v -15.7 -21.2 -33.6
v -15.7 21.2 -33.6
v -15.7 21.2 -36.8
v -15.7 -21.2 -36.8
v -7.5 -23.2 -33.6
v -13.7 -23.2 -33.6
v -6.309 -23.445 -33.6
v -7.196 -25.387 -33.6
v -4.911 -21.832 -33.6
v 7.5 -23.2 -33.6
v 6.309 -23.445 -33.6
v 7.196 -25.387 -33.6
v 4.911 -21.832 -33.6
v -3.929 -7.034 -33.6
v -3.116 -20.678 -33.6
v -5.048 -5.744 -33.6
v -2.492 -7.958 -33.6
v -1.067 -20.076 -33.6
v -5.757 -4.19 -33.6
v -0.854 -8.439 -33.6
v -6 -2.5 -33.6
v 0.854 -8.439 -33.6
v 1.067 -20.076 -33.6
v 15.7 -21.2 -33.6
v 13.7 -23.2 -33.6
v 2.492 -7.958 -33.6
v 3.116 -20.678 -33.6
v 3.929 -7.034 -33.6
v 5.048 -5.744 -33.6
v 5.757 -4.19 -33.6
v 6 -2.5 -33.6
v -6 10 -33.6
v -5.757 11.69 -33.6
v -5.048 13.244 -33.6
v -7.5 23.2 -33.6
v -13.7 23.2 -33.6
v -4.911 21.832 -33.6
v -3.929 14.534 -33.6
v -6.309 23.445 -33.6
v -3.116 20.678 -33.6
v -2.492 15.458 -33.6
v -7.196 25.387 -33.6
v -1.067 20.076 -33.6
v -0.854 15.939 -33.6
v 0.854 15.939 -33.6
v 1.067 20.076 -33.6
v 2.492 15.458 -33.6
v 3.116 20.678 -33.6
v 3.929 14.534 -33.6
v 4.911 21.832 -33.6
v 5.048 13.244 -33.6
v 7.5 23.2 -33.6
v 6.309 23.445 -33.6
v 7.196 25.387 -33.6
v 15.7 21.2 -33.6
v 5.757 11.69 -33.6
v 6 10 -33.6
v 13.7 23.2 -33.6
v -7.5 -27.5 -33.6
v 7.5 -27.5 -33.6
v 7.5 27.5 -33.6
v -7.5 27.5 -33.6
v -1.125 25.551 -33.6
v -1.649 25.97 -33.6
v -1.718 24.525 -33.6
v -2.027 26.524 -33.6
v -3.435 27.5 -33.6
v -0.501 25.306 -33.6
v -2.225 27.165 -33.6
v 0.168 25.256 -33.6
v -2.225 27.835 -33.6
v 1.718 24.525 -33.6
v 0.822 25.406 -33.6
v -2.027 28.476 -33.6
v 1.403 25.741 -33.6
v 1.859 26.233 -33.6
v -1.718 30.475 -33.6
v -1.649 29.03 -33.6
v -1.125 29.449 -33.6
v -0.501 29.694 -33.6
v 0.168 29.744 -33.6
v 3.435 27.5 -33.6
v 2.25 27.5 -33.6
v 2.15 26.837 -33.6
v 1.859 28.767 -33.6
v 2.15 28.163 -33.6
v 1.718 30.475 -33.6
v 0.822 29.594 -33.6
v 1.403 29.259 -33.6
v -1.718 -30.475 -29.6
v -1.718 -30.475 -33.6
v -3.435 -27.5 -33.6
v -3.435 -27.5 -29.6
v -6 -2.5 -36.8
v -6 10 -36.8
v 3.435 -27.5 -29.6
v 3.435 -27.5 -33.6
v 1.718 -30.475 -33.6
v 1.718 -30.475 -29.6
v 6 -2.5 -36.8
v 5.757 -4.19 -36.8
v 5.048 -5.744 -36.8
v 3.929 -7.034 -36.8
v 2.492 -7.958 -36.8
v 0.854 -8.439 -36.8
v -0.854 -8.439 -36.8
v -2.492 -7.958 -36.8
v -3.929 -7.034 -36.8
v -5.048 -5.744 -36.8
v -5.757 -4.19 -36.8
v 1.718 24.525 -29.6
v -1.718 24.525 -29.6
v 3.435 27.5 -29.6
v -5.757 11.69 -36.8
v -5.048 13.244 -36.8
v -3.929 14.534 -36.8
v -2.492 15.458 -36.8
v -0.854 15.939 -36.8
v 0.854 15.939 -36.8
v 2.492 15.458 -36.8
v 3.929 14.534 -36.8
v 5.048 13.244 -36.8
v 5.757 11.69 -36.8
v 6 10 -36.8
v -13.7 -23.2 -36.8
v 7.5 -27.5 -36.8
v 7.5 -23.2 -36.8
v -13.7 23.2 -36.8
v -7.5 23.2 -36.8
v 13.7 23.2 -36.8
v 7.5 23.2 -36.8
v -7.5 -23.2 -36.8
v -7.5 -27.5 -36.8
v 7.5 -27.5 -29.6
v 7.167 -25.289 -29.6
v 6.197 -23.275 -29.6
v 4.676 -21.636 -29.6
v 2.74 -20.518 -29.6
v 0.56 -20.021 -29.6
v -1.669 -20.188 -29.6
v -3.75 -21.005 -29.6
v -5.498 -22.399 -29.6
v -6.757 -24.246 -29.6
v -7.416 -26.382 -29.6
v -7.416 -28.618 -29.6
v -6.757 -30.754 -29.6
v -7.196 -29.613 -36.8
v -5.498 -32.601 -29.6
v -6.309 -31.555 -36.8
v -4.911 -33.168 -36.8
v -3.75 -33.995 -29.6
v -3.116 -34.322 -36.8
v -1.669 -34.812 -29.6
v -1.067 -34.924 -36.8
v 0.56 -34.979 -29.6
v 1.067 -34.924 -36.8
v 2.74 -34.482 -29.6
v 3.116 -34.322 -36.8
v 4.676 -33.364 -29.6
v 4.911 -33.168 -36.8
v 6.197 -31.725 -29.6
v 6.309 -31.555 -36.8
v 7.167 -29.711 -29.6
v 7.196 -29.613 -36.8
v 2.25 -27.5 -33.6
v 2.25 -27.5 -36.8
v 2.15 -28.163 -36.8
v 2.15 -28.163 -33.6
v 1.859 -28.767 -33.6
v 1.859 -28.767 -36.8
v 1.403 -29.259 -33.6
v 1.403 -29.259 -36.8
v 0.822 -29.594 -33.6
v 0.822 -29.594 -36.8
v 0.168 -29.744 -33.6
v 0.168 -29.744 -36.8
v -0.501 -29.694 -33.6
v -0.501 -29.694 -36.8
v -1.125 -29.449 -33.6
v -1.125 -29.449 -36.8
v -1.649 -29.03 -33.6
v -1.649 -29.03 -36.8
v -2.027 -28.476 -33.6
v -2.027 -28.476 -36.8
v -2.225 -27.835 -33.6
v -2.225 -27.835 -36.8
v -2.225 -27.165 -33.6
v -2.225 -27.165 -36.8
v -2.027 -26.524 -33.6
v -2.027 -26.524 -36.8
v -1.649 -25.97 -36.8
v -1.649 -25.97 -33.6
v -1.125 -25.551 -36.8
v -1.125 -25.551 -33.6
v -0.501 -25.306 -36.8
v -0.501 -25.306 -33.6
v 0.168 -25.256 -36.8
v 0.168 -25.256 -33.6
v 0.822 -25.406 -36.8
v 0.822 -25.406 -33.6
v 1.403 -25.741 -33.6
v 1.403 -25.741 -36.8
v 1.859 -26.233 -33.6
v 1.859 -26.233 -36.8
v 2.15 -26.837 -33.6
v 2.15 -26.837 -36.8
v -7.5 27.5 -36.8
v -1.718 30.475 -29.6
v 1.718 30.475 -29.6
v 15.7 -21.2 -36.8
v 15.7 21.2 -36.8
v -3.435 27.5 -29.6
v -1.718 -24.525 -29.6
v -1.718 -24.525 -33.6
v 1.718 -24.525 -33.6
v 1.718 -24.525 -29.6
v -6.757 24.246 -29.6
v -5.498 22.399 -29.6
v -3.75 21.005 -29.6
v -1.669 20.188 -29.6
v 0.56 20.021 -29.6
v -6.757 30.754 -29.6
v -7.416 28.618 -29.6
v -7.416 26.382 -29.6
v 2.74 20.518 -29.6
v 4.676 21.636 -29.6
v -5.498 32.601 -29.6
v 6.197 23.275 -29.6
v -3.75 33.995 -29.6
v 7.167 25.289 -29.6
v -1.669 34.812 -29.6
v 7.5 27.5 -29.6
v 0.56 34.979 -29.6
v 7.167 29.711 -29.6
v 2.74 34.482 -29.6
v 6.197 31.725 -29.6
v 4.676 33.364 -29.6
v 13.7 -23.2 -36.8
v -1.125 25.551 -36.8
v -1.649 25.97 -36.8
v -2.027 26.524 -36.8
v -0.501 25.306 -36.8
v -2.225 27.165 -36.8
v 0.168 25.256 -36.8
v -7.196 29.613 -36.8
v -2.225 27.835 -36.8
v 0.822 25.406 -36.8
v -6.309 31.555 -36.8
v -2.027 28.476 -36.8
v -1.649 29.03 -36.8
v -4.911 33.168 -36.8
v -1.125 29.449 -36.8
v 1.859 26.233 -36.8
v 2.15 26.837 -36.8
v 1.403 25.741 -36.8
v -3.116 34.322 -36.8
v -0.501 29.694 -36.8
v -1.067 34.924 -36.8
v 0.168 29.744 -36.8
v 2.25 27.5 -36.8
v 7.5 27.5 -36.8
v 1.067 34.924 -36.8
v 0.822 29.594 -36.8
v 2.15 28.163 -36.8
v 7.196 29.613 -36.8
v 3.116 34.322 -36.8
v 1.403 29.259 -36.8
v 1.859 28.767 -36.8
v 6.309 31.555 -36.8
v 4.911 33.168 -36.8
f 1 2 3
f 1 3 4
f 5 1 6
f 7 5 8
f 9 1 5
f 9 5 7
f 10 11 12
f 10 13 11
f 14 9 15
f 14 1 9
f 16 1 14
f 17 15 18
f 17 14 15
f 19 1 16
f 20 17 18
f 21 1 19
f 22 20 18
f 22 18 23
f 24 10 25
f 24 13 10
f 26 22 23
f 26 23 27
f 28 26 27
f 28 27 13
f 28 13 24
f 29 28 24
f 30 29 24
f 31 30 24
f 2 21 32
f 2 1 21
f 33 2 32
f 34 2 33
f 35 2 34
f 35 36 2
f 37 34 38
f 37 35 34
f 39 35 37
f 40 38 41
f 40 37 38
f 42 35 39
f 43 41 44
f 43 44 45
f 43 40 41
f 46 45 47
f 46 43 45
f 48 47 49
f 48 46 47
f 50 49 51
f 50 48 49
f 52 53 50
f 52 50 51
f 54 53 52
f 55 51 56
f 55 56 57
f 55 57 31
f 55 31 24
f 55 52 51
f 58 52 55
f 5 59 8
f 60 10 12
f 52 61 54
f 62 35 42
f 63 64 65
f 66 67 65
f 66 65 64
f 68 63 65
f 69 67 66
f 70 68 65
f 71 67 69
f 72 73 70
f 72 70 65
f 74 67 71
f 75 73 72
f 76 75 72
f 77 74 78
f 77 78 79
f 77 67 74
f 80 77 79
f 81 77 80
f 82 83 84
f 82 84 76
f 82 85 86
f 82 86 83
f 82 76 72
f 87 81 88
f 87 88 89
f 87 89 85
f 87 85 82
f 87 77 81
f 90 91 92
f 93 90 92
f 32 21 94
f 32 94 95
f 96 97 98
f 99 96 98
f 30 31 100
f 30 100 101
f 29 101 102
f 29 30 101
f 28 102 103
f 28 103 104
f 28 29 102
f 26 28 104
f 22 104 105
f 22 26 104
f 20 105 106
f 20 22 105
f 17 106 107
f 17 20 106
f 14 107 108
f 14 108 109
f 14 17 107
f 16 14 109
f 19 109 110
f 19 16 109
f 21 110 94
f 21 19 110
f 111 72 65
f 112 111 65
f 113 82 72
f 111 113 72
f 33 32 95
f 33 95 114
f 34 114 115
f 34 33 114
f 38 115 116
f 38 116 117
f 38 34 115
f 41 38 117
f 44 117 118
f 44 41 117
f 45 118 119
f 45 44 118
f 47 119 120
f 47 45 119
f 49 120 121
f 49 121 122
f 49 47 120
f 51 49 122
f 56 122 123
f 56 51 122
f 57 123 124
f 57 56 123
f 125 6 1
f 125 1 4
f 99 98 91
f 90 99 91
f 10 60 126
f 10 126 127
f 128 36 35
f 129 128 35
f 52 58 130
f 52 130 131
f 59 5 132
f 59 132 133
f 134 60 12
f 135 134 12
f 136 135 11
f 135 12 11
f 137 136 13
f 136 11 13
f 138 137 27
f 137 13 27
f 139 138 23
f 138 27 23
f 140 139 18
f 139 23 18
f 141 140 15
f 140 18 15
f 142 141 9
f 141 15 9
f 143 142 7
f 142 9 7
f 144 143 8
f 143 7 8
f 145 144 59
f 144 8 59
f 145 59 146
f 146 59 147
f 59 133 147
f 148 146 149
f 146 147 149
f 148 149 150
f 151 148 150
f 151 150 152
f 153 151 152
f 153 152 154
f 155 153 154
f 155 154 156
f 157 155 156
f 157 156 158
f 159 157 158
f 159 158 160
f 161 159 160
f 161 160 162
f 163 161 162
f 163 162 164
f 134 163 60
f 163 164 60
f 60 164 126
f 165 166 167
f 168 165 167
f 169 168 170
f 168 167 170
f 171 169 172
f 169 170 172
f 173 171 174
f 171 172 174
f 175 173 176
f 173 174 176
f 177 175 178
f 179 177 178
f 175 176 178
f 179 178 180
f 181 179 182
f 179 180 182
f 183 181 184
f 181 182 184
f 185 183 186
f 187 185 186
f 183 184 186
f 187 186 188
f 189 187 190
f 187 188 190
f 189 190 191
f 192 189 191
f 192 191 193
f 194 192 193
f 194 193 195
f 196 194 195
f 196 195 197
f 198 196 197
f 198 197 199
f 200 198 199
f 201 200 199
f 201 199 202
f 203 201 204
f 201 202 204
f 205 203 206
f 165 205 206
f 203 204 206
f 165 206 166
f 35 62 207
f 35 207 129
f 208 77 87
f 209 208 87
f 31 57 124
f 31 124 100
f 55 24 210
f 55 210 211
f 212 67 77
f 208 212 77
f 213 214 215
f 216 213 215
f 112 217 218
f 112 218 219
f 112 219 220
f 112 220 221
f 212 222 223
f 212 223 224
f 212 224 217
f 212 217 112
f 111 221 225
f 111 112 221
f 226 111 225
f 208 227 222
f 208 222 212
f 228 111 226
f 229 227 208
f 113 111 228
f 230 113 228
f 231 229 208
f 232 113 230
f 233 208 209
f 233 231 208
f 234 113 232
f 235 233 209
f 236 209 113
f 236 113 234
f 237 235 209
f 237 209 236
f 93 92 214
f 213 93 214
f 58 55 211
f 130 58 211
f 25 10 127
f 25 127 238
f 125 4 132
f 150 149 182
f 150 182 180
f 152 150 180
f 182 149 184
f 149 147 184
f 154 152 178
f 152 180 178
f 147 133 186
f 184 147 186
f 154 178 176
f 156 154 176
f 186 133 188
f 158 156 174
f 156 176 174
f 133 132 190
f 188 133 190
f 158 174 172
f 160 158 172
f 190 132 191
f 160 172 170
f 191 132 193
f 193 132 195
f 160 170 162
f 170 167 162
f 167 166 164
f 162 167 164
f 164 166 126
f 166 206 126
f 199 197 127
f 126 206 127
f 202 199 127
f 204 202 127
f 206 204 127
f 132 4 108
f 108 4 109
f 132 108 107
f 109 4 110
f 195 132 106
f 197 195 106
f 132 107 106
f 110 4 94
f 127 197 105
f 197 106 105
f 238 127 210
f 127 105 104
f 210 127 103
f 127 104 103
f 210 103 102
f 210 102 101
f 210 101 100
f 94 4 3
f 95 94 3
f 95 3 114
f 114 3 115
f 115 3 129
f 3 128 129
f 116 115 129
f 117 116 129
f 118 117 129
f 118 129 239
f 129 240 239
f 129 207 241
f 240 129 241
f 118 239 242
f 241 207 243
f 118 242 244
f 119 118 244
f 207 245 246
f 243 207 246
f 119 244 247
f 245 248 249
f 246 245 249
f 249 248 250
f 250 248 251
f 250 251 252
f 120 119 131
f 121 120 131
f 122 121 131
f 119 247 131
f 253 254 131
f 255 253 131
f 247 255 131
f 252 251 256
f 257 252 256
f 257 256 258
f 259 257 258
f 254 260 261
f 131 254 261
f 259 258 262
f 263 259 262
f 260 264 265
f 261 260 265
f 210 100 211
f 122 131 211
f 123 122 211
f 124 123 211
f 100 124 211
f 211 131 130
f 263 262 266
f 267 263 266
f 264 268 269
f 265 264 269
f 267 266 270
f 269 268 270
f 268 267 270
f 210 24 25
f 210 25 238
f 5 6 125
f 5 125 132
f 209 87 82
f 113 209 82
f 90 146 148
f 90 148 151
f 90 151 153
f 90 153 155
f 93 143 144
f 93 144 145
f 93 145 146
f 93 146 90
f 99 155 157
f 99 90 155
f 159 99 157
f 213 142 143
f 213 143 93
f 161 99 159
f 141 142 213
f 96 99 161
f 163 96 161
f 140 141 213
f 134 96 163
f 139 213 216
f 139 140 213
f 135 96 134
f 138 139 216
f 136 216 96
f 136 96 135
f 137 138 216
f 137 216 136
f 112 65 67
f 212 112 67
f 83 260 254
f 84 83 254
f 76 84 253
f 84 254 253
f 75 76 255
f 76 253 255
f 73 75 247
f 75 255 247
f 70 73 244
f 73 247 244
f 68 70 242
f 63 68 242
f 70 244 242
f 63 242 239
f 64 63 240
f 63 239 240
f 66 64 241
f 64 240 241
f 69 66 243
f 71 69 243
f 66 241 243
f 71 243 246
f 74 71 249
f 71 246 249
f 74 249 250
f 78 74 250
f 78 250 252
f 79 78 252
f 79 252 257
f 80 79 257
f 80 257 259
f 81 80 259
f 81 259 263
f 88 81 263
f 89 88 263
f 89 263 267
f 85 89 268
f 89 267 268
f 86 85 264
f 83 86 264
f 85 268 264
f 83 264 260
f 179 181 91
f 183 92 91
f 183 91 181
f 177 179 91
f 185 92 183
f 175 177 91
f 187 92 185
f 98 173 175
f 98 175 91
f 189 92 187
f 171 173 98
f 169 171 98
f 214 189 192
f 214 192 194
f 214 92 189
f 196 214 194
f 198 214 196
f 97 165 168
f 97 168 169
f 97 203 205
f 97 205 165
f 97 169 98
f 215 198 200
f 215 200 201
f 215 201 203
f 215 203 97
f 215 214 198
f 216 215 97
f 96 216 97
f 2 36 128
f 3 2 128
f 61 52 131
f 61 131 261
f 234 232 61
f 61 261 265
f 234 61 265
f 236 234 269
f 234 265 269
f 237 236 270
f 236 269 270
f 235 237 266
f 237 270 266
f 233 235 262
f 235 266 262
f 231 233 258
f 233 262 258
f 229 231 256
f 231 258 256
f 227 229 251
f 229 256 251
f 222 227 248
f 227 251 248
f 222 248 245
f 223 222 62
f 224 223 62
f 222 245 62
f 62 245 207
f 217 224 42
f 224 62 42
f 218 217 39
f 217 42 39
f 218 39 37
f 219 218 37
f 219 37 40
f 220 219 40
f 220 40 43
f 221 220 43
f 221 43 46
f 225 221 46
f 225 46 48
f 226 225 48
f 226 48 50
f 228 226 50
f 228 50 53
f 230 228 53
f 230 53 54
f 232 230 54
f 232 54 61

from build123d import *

# Parameters (mm, degrees)
F0_W      = 25
F0_H      = 40
F0_R      = 6.25
F1_DEPTH  = 3.2
F2_W      = 25
F2_H      = 40
F3_DEPTH  = 40
F4_W      = 15
F4_H      = 46.4
F4_R      = 2.25
F5_DEPTH  = 5
F6_SIZE   = 2
F7_R      = 2.25
F8_DEPTH  = 3.2
F9_W      = 46.4
F9_H      = 70
F10_DEPTH = 36.8
F11_W     = 25
F11_H     = 40
F12_DEPTH = 3.2
F13_R     = 7.5
F14_DEPTH = 4


with BuildPart() as f1:
    # F0 (on Top) → F1 (new body)
    with BuildSketch(Plane.XY):
        Rectangle(F0_W, F0_H)
        Circle(F0_R, mode=Mode.SUBTRACT)
    extrude(amount=F1_DEPTH)

    # F2 (on face) → F3 (join)
    with BuildSketch(Plane.XY.offset(3.2)):
        with BuildLine():
            Line((15.7, -23.2), (15.7, 23.2))
            Line((15.7, 23.2), (7.5, 23.2))
            Line((7.5, 23.2), (7.5, 27.5))
            ThreePointArc((7.5, 27.5), (0, 35), (-7.5, 27.5))
            Line((-7.5, 27.5), (-7.5, 23.2))
            Line((-7.5, 23.2), (-15.7, 23.2))
            Line((-15.7, 23.2), (-15.7, -23.2))
            Line((-15.7, -23.2), (-7.5, -23.2))
            Line((-7.5, -23.2), (-7.5, -27.5))
            ThreePointArc((-7.5, -27.5), (0, -35), (7.5, -27.5))
            Line((7.5, -27.5), (7.5, -23.2))
            Line((7.5, -23.2), (15.7, -23.2))
        make_face()
        Polygon((-3.435234, -27.5), (-1.717617, -24.525), (1.717617, -24.525), (3.435234, -27.5), (1.717617, -30.475), (-1.717617, -30.475), align=None, mode=Mode.SUBTRACT)
        Rectangle(F2_W, F2_H, mode=Mode.SUBTRACT)
        Polygon((-3.435234, 27.5), (-1.717617, 30.475), (1.717617, 30.475), (3.435234, 27.5), (1.717617, 24.525), (-1.717617, 24.525), align=None, mode=Mode.SUBTRACT)
    extrude(amount=-F3_DEPTH)

    # F4 (on face) → F5 (join)
    with BuildSketch(Plane.XY.offset(3.2)):
        with Locations((-23.2, 0)):
            Rectangle(F4_W, F4_H)
        with Locations((-23.2, -13.2)):
            Circle(F4_R, mode=Mode.SUBTRACT)
        with Locations((-23.2, 13.2)):
            Circle(F4_R, mode=Mode.SUBTRACT)
    extrude(amount=-F5_DEPTH)

    # F6
    f6_edges = [f1.edges().sort_by_distance(p)[0] for p in [
        (15.7, 23.2, -16.8),
        (-15.7, 23.2, -19.3),
        (-15.7, -23.2, -19.3),
        (15.7, -23.2, -16.8),
        (-30.7, 23.2, 0.7),
        (-30.7, -23.2, 0.7),
    ]]
    chamfer(f6_edges, length=F6_SIZE)

    # F7 (on face) → F8 (join)
    with BuildSketch(Plane(origin=(0, 0, -36.8), x_dir=(1, 0, 0), z_dir=(0, 0, -1))):
        Polygon((1.717617, 30.475), (-1.717617, 30.475), (-3.435234, 27.5), (-1.717617, 24.525), (1.717617, 24.525), (3.435234, 27.5), align=None)
        with Locations((0, 27.5)):
            Circle(F7_R, mode=Mode.SUBTRACT)
        Polygon((-3.435234, -27.5), (-1.717617, -30.475), (1.717617, -30.475), (3.435234, -27.5), (1.717617, -24.525), (-1.717617, -24.525), align=None)
        with Locations((0, -27.5)):
            Circle(F7_R, mode=Mode.SUBTRACT)
    extrude(amount=-F8_DEPTH)

    # F9 (on face) → F10 (cut)
    with BuildSketch(Plane.XY.offset(3.2)):
        with Locations((-7.5, 0)):
            Rectangle(F9_W, F9_H)
    extrude(amount=-F10_DEPTH, mode=Mode.SUBTRACT)

    # F11 (on face) → F12 (join)
    with BuildSketch(Plane.XY.offset(-33.6)):
        Rectangle(F11_W, F11_H)
        with BuildLine():
            ThreePointArc((-6, 10), (0, 16), (6, 10))
            Line((6, 10), (6, -2.5))
            ThreePointArc((6, -2.5), (0, -8.5), (-6, -2.5))
            Line((-6, -2.5), (-6, 10))
        make_face(mode=Mode.SUBTRACT)
    extrude(amount=-F12_DEPTH)

    # F13 (on face) → F14 (join)
    with BuildSketch(Plane.XY.offset(-33.6)):
        with Locations((0, 27.5)):
            Circle(F13_R)
        Polygon((-3.435234, 27.5), (-1.717617, 30.475), (1.717617, 30.475), (3.435234, 27.5), (1.717617, 24.525), (-1.717617, 24.525), align=None, mode=Mode.SUBTRACT)
        with Locations((0, -27.5)):
            Circle(F13_R)
        Polygon((-3.435234, -27.5), (-1.717617, -24.525), (1.717617, -24.525), (3.435234, -27.5), (1.717617, -30.475), (-1.717617, -30.475), align=None, mode=Mode.SUBTRACT)
    extrude(amount=F14_DEPTH)


solid = f1.part
